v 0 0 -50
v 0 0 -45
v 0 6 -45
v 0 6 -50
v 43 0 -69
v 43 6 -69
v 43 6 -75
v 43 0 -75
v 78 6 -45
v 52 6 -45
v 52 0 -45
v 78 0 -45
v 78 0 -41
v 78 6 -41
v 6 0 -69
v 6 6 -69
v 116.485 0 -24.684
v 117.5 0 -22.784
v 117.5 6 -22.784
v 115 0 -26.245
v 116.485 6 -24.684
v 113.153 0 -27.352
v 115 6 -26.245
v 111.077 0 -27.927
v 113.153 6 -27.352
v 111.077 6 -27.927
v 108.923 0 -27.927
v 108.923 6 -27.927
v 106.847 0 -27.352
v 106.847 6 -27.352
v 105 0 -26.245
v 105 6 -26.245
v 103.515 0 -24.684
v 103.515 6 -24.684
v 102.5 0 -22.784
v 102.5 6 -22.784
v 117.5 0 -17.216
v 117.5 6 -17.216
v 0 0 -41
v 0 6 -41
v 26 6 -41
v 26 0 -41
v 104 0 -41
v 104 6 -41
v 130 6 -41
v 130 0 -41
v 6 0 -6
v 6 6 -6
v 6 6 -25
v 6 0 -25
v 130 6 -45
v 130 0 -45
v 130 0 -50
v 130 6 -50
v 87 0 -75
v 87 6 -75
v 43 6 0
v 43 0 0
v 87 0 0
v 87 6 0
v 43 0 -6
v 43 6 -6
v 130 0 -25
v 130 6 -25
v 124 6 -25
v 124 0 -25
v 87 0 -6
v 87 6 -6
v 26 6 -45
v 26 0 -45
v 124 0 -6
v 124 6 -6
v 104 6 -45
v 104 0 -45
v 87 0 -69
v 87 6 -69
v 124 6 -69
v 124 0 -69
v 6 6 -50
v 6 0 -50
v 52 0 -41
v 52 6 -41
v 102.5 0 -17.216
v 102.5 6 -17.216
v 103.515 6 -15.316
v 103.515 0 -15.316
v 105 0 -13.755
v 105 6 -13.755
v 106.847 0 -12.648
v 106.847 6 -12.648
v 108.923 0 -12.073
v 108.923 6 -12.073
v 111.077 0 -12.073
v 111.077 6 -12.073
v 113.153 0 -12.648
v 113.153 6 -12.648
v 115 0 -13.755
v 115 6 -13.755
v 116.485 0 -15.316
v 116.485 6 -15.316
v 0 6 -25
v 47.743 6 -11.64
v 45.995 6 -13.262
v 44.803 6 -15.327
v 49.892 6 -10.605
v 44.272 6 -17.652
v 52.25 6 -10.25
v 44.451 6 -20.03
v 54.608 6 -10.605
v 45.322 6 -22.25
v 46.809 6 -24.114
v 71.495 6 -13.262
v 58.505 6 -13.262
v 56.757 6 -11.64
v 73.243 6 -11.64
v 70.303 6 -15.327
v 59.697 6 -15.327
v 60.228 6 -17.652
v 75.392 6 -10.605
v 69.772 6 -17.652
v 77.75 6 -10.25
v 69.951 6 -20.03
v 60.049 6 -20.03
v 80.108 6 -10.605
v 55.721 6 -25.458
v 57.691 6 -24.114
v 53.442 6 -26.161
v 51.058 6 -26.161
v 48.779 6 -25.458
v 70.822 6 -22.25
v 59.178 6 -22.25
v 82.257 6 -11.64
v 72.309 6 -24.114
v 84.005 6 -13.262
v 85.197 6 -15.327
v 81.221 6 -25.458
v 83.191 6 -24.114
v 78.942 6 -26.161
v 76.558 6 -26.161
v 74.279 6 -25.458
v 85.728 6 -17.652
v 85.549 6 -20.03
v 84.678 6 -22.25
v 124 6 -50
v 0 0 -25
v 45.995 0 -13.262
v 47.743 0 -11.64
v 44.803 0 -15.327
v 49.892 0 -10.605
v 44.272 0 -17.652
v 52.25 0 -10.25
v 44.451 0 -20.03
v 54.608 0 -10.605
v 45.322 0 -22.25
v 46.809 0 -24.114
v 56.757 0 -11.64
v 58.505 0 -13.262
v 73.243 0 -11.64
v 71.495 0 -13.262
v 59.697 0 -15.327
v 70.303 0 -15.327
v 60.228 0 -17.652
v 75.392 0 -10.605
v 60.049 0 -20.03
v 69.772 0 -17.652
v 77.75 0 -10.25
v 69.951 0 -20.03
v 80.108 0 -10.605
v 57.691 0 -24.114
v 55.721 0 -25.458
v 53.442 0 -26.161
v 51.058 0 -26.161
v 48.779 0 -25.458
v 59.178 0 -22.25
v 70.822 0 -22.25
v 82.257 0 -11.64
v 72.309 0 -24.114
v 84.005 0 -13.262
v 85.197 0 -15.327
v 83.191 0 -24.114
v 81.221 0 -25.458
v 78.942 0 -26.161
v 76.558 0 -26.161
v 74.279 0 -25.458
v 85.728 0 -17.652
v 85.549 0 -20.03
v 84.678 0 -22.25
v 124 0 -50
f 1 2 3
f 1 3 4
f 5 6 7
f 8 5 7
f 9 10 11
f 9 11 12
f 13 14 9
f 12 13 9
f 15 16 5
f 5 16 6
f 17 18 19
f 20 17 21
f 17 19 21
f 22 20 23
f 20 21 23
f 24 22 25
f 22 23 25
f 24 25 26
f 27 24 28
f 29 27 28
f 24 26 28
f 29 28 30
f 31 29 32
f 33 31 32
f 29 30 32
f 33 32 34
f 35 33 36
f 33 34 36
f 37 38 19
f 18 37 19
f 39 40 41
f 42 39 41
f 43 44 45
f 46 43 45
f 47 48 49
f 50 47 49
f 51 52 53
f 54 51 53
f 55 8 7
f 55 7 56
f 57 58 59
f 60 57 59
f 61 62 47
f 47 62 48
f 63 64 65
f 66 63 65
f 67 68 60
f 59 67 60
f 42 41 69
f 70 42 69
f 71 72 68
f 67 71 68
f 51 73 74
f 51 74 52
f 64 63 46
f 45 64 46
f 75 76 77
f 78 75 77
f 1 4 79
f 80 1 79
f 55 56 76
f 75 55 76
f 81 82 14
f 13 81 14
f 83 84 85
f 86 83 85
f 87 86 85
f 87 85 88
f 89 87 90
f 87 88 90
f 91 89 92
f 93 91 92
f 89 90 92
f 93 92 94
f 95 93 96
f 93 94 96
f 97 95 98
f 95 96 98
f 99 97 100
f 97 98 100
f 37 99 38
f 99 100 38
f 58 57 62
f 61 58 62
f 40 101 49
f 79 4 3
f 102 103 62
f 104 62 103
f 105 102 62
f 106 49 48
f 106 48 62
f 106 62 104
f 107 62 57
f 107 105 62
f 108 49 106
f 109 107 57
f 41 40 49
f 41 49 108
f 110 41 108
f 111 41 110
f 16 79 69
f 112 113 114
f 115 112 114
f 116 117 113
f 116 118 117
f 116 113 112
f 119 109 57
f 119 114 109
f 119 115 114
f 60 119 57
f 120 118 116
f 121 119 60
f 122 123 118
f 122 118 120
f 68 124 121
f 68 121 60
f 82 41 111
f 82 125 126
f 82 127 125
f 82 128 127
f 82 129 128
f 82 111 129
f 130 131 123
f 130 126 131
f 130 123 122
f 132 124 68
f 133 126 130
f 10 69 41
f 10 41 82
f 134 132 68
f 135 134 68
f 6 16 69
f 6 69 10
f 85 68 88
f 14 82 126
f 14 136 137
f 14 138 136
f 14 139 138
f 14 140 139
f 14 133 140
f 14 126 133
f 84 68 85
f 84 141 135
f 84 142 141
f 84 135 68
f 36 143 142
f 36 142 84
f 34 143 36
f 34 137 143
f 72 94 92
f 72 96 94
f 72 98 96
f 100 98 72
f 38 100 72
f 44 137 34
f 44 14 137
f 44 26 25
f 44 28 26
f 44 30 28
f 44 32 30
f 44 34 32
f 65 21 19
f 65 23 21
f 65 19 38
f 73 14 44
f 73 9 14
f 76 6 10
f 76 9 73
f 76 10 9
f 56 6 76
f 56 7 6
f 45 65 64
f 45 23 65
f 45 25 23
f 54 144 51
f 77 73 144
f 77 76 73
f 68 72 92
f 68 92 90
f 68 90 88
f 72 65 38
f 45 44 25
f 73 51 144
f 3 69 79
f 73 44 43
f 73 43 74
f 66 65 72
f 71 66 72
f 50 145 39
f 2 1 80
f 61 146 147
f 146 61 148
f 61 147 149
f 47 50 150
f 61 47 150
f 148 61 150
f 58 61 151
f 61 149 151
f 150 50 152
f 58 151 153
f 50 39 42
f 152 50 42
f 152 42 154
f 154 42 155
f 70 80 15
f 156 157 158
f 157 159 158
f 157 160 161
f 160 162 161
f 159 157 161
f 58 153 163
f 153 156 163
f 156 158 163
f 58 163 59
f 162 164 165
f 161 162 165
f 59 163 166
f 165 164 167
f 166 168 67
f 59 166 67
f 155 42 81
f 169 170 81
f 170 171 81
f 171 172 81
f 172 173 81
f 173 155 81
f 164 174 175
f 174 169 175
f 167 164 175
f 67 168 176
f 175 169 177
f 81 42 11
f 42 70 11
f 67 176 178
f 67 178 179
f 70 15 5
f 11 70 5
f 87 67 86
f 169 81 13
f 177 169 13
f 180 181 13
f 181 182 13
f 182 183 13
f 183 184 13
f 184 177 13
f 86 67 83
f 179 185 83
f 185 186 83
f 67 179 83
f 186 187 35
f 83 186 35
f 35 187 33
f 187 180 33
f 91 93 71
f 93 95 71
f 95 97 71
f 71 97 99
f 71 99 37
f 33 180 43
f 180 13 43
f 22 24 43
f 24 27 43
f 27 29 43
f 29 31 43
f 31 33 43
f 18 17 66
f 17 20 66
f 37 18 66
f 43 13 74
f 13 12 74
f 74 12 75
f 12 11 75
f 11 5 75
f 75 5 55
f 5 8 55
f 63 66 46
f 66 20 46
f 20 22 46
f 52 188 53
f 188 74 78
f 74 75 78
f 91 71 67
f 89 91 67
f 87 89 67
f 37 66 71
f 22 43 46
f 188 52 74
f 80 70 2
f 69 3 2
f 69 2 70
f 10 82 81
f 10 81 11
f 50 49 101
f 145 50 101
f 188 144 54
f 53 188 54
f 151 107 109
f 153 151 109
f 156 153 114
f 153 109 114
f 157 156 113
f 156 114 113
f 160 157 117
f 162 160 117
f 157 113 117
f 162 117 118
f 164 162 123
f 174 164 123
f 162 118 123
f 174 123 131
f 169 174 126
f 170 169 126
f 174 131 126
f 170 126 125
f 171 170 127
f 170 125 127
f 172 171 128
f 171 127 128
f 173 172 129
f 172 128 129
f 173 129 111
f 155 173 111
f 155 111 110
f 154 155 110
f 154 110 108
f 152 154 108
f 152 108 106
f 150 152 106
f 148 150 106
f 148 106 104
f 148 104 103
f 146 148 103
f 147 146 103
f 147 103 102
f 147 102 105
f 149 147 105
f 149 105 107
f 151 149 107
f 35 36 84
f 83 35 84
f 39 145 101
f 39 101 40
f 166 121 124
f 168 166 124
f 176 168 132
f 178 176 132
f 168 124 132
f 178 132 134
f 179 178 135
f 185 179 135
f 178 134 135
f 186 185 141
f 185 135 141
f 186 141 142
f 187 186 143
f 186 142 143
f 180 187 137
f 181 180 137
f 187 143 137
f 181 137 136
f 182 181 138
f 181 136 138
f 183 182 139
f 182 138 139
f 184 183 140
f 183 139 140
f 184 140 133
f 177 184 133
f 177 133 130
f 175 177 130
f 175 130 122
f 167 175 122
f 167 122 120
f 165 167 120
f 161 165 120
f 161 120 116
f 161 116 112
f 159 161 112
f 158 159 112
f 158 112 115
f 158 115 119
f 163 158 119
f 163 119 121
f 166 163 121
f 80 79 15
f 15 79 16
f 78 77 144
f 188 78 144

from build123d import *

# Parameters (mm, degrees)
SKETCH1_W           = 130
SKETCH1_H           = 75
BOSS_EXTRUDE1_DEPTH = 6
SKETCH2_R           = 8
CUT_EXTRUDE1_DEPTH  = 151.203195705
SKETCH3_W           = 26
SKETCH3_H           = 4
CUT_EXTRUDE2_DEPTH  = 151.203195705
CUT_EXTRUDE3_DEPTH  = 151.203195705


with BuildPart() as part:
    # Sketch1 → Boss-Extrude1 (new body)
    with BuildSketch(Plane(origin=(0, 0, 0), x_dir=(1, 0, 0), z_dir=(0, 1, 0))):
        with Locations((65, 37.5)):
            Rectangle(SKETCH1_W, SKETCH1_H)
    extrude(amount=BOSS_EXTRUDE1_DEPTH)

    # Sketch2 → Cut-Extrude1 (cut, through all)
    with BuildSketch(Plane(origin=(0, 6, 0), x_dir=(1, 0, 0), z_dir=(0, 1, 0))):
        with Locations(Location((52.25, 18.25, 0), (0, 0, 270))):
            Circle(SKETCH2_R)
        with Locations(Location((77.75, 18.25, 0), (0, 0, 270))):
            Circle(SKETCH2_R)
    extrude(amount=-CUT_EXTRUDE1_DEPTH, mode=Mode.SUBTRACT)

    # Sketch3 → Cut-Extrude2 (cut, through all)
    with BuildSketch(Plane(origin=(0, 6, 0), x_dir=(1, 0, 0), z_dir=(0, 1, 0))):
        Polygon((0, 75), (0, 50), (6, 50), (6, 69), (43, 69), (43, 75), align=None)
        Polygon((87, 75), (87, 69), (124, 69), (124, 50), (130, 50), (130, 75), align=None)
        with Locations((13, 43)):
            Rectangle(SKETCH3_W, SKETCH3_H)
        Polygon((6, 25), (0, 25), (0, 0), (43, 0), (43, 6), (6, 6), align=None)
        with Locations((65, 43)):
            Rectangle(SKETCH3_W, SKETCH3_H)
        with Locations((117, 43)):
            Rectangle(SKETCH3_W, SKETCH3_H)
        Polygon((130, 25), (124, 25), (124, 6), (87, 6), (87, 0), (130, 0), align=None)
    extrude(amount=-CUT_EXTRUDE2_DEPTH, mode=Mode.SUBTRACT)

    # Sketch4 → Cut-Extrude3 (cut, through all)
    with BuildSketch(Plane(origin=(0, 6, 0), x_dir=(1, 0, 0), z_dir=(0, 1, 0))):
        with BuildLine():
            Line((102.5, 22.783882181), (102.5, 17.216117819))
            ThreePointArc((102.5, 17.216117819), (110, 12), (117.5, 17.216117819))
            Line((117.5, 17.216117819), (117.5, 22.783882181))
            ThreePointArc((117.5, 22.783882181), (110, 28), (102.5, 22.783882181))
        make_face()
    extrude(amount=-CUT_EXTRUDE3_DEPTH, mode=Mode.SUBTRACT)


solid = part.part
